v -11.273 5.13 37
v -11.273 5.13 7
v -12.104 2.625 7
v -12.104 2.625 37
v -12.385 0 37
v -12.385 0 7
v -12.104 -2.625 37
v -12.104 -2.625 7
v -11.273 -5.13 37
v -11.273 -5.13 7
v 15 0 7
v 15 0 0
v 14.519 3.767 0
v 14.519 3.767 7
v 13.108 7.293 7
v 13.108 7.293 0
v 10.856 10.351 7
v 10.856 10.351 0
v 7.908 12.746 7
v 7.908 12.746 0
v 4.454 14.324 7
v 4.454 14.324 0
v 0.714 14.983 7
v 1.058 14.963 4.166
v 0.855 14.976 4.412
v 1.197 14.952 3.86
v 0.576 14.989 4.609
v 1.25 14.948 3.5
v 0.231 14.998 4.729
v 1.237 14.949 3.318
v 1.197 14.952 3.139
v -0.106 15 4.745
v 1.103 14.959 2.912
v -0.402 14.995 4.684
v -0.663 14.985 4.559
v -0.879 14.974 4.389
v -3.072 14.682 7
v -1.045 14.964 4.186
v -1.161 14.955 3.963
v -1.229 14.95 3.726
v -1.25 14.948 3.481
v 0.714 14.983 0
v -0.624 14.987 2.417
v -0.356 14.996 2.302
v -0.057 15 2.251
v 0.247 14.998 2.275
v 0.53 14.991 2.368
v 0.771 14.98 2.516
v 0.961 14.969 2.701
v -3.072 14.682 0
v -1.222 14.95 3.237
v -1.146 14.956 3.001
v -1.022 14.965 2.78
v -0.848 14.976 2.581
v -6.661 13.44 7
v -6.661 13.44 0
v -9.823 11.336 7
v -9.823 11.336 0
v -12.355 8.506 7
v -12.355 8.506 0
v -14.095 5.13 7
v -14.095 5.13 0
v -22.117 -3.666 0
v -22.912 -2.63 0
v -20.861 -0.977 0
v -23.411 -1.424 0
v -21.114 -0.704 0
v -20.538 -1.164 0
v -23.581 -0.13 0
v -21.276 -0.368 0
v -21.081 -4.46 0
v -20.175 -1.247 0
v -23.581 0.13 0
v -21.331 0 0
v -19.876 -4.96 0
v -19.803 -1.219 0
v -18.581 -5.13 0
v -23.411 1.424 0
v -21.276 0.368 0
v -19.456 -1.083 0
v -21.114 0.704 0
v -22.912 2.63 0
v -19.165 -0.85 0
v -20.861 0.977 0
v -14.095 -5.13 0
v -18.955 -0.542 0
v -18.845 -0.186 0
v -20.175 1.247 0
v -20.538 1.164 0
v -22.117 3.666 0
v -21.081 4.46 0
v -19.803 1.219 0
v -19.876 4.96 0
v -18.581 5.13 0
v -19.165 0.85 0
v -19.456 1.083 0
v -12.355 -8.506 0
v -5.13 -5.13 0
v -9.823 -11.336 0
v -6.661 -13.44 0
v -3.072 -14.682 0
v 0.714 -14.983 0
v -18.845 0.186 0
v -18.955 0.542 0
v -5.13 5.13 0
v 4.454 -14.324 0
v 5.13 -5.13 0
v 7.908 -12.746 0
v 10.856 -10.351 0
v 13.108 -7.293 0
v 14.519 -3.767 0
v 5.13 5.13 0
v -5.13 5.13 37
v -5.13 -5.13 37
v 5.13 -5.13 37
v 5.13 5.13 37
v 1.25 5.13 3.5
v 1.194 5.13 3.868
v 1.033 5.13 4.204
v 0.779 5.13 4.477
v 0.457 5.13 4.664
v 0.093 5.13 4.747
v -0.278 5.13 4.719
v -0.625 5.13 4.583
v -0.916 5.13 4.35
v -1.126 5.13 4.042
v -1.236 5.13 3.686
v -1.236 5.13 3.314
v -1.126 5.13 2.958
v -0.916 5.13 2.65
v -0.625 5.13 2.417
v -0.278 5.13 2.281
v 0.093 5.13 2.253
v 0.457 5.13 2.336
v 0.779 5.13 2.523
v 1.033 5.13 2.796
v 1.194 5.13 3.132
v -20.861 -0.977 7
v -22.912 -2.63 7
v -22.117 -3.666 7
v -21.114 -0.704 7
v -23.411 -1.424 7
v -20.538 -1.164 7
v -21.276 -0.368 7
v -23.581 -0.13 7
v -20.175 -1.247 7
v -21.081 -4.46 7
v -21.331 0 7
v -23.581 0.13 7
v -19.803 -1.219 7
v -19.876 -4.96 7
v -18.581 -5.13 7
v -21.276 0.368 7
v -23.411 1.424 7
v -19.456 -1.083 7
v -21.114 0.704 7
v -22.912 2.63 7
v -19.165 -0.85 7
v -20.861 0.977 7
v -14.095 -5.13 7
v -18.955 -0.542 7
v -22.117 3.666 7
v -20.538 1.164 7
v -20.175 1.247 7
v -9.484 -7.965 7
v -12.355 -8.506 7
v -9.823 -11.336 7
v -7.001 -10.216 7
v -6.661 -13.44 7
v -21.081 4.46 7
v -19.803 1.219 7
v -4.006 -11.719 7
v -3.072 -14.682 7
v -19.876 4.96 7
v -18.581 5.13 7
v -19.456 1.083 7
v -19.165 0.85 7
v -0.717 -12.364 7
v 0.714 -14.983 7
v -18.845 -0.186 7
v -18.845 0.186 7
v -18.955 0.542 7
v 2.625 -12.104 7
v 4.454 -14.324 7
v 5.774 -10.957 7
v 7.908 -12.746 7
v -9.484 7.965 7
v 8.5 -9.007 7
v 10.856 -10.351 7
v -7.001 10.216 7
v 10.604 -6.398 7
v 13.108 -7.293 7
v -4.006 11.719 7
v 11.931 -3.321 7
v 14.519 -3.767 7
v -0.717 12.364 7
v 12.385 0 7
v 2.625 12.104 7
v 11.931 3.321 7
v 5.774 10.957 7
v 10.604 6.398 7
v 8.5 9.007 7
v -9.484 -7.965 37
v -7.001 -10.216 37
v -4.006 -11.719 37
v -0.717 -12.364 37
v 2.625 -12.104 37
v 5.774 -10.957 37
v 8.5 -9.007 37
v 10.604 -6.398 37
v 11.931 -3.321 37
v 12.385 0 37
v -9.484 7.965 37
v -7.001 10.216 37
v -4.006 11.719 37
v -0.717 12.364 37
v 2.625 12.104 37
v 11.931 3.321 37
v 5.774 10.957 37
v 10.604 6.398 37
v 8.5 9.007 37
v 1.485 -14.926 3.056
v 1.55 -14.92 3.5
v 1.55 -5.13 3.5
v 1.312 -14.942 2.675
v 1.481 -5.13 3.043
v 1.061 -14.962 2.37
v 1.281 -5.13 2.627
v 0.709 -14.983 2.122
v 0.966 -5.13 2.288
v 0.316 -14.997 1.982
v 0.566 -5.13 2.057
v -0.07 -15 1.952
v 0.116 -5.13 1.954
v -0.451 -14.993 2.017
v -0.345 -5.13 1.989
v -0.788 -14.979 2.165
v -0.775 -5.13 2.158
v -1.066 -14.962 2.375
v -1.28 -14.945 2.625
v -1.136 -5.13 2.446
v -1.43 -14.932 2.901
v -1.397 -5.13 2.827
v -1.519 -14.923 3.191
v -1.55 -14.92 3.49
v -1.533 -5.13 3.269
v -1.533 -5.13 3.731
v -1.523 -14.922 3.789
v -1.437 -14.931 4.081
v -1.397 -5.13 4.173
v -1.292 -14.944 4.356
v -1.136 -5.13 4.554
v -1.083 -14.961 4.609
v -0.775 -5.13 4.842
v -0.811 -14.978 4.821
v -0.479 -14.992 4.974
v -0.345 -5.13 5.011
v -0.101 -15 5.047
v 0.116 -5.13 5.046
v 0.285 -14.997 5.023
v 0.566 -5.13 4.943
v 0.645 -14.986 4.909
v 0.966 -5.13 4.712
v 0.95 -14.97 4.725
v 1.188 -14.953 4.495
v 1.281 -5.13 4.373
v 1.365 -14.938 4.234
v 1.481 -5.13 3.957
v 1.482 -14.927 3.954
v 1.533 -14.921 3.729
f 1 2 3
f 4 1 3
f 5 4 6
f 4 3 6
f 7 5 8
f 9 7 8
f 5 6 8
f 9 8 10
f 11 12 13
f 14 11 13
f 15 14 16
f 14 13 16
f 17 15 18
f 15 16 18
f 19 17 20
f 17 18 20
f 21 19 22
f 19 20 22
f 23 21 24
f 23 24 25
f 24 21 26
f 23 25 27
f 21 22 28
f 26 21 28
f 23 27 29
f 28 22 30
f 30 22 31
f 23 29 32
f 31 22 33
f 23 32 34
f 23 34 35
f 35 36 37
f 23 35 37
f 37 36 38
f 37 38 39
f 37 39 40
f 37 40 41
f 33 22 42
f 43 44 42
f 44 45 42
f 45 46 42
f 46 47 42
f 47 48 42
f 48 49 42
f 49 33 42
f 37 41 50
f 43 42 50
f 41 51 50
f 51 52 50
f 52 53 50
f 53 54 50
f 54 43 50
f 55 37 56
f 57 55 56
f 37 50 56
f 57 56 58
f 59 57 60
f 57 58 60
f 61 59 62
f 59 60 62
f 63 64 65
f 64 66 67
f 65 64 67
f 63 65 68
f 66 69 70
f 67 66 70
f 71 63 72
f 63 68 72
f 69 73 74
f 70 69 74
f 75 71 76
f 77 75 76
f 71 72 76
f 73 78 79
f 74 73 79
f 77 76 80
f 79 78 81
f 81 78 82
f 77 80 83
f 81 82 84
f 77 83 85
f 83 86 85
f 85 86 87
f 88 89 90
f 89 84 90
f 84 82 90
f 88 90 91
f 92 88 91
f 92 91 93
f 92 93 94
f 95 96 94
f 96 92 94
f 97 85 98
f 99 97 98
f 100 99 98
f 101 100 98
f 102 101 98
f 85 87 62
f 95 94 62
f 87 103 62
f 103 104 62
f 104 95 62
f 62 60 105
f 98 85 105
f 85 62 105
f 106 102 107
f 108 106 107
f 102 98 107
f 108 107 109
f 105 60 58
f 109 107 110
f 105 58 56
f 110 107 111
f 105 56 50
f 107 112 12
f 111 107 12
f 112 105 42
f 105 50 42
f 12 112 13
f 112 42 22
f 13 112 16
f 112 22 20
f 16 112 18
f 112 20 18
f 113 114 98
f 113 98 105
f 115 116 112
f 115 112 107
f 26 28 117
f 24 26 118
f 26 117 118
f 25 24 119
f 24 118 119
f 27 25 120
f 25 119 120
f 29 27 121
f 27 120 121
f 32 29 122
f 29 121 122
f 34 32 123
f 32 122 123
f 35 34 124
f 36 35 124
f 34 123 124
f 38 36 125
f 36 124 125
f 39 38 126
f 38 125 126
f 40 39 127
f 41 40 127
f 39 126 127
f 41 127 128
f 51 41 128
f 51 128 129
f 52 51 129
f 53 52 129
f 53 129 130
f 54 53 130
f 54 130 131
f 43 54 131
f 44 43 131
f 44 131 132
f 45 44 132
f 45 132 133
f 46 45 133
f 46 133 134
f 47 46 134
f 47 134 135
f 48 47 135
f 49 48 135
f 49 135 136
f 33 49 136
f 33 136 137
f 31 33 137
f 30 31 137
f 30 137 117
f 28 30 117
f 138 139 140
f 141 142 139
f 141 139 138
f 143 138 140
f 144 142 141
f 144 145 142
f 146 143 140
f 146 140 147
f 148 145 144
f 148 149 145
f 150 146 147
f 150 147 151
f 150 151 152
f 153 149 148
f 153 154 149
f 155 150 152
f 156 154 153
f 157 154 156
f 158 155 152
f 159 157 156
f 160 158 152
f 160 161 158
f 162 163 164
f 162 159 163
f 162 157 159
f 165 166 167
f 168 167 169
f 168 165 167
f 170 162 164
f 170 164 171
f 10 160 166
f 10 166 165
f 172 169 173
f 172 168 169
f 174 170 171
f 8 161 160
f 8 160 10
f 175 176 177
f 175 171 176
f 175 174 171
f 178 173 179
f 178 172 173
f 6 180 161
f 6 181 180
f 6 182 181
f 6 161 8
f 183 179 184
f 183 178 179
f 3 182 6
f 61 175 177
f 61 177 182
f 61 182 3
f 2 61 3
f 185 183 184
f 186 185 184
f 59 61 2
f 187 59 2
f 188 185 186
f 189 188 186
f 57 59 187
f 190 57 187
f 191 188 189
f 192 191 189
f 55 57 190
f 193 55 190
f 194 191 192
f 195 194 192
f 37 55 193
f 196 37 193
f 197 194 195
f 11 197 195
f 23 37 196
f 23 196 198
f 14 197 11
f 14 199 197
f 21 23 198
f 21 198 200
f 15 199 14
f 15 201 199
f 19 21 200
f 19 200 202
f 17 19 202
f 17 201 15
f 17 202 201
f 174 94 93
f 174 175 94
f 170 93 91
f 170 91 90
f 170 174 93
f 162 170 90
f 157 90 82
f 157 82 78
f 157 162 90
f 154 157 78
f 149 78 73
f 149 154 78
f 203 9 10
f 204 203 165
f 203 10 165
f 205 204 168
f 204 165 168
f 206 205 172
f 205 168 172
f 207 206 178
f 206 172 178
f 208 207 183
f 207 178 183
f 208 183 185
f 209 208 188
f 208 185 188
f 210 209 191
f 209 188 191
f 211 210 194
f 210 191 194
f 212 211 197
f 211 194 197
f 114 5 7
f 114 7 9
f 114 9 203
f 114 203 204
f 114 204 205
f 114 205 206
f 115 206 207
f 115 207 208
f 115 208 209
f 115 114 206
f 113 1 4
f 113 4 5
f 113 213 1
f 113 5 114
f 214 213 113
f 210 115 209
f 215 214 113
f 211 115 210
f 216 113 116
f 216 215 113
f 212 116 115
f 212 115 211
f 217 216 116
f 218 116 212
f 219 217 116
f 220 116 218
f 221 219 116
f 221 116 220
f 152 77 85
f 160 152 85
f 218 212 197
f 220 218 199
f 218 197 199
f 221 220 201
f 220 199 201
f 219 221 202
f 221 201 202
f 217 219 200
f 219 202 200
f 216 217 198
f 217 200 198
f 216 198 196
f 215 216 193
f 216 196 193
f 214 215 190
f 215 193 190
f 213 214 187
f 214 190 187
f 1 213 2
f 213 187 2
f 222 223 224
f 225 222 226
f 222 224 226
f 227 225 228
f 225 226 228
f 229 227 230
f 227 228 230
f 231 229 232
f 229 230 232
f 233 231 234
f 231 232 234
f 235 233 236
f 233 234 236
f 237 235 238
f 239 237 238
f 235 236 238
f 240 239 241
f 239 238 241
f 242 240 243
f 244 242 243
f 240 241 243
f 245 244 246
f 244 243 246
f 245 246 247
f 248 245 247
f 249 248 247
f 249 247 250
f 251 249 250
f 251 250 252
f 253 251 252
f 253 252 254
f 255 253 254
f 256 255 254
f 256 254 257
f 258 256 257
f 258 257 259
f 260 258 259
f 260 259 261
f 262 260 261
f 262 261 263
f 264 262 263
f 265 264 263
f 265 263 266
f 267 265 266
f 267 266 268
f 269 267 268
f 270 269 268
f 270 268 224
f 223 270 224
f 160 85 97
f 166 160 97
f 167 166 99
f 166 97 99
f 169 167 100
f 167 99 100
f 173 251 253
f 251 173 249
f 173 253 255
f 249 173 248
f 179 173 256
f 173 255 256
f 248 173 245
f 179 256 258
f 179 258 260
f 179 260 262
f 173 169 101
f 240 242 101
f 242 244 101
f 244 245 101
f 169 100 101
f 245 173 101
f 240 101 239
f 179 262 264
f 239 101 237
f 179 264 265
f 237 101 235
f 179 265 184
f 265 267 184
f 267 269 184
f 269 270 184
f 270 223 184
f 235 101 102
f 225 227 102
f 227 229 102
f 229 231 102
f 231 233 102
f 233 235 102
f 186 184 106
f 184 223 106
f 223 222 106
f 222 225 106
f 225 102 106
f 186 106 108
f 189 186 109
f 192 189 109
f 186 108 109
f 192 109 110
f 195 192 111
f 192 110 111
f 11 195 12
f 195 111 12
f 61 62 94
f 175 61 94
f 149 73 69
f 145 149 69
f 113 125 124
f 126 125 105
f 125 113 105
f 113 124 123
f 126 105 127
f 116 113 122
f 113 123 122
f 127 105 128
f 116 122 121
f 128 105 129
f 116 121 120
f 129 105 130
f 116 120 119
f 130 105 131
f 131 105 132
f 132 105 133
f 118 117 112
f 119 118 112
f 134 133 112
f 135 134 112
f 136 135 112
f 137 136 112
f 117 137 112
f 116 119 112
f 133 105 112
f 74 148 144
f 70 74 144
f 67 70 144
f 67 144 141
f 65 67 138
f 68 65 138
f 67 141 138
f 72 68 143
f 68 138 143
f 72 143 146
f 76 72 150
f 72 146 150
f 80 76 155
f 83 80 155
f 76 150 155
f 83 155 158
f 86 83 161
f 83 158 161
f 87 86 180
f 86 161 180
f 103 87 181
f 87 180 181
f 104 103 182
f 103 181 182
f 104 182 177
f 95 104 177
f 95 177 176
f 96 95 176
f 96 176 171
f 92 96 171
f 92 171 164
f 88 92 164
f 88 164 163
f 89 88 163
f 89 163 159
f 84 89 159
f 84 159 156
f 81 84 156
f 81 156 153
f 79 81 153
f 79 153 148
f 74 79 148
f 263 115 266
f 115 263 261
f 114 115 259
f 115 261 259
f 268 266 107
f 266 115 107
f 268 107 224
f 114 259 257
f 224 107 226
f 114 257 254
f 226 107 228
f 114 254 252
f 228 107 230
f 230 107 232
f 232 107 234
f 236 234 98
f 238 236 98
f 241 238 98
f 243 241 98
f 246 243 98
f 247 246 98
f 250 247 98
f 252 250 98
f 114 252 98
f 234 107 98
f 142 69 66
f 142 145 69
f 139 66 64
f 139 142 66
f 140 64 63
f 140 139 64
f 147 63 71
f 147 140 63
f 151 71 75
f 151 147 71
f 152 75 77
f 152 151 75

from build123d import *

# Parameters (mm, degrees)
F1_DEPTH = 7
F2_DEPTH = 37
F4_D     = 2.5
F4_DEPTH = 9.871
F5_D     = 3.1
F5_DEPTH = 20.1310001
F6_R     = 5
F7_D     = 2.5


with BuildPart() as f1:
    # F0 (on Top) → F1 (new body)
    with BuildSketch(Plane.XY):
        with BuildLine():
            ThreePointArc((-14.0954992817, -5.13), (2.6045643373, -14.7721442117), (15, 0))
            ThreePointArc((15, 0), (2.6045643373, 14.7721442117), (-14.0954992817, 5.13))
            Line((-14.0954992817, 5.13), (-11.2725917605, 5.13))
            ThreePointArc((-11.2725917605, 5.13), (2.6246119757, 12.1037034406), (12.385, 0))
            ThreePointArc((12.385, 0), (2.6246119757, -12.1037034406), (-11.2725917605, -5.13))
            Line((-11.2725917605, -5.13), (-14.0954992817, -5.13))
        make_face()
        with BuildLine():
            Line((-11.2725917605, 5.13), (-14.0954992817, 5.13))
            ThreePointArc((-14.0954992817, 5.13), (-15, 0), (-14.0954992817, -5.13))
            Line((-14.0954992817, -5.13), (-11.2725917605, -5.13))
            ThreePointArc((-11.2725917605, -5.13), (-12.385, 0), (-11.2725917605, 5.13))
        make_face()
        with BuildLine():
            ThreePointArc((12.385, 0), (2.6246119757, 12.1037034406), (-11.2725917605, 5.13))
            Line((-11.2725917605, 5.13), (-5.13, 5.13))
            Line((-5.13, 5.13), (5.13, 5.13))
            Line((5.13, 5.13), (5.13, -5.13))
            Line((5.13, -5.13), (-5.13, -5.13))
            Line((-5.13, -5.13), (-11.2725917605, -5.13))
            ThreePointArc((-11.2725917605, -5.13), (2.6246119757, -12.1037034406), (12.385, 0))
        make_face()
        with BuildLine():
            Line((-5.13, 5.13), (-11.2725917605, 5.13))
            ThreePointArc((-11.2725917605, 5.13), (-12.385, 0), (-11.2725917605, -5.13))
            Line((-11.2725917605, -5.13), (-5.13, -5.13))
            Line((-5.13, -5.13), (-5.13, 5.13))
        make_face()
        with BuildLine():
            ThreePointArc((-14.0954992817, -5.13), (-15, 0), (-14.0954992817, 5.13))
            Line((-14.0954992817, 5.13), (-23.5814342785, 5.13))
            Line((-23.5814342785, 5.13), (-23.5814342785, 0))
            Line((-23.5814342785, 0), (-23.5814342785, -5.13))
            Line((-23.5814342785, -5.13), (-14.0954992817, -5.13))
        make_face()
    extrude(amount=F1_DEPTH)

    # F0 (on Top) → F2 (join)
    with BuildSketch(Plane.XY):
        with BuildLine():
            Line((-5.13, 5.13), (-11.2725917605, 5.13))
            ThreePointArc((-11.2725917605, 5.13), (-12.385, 0), (-11.2725917605, -5.13))
            Line((-11.2725917605, -5.13), (-5.13, -5.13))
            Line((-5.13, -5.13), (-5.13, 5.13))
        make_face()
        with BuildLine():
            ThreePointArc((12.385, 0), (2.6246119757, 12.1037034406), (-11.2725917605, 5.13))
            Line((-11.2725917605, 5.13), (-5.13, 5.13))
            Line((-5.13, 5.13), (5.13, 5.13))
            Line((5.13, 5.13), (5.13, -5.13))
            Line((5.13, -5.13), (-5.13, -5.13))
            Line((-5.13, -5.13), (-11.2725917605, -5.13))
            ThreePointArc((-11.2725917605, -5.13), (2.6246119757, -12.1037034406), (12.385, 0))
        make_face()
    extrude(amount=F2_DEPTH)

    # F4 (through all, one way)
    with BuildSketch(Plane.XZ.offset(-5.13)):
        with Locations((0, 3.5)):
            Circle(F4_D / 2)
    extrude(amount=-F4_DEPTH, mode=Mode.SUBTRACT)

    # F5 (through all, one way)
    with BuildSketch(Plane(origin=(0, 5.13, 0), x_dir=(1, 0, 0), z_dir=(0, 1, 0))):
        with Locations((0, -3.5)):
            Circle(F5_D / 2)
    extrude(amount=-F5_DEPTH, mode=Mode.SUBTRACT)

    # F6
    f6_edges = [f1.edges().sort_by_distance(p)[0] for p in [
        (-23.581434, -5.13, 3.5),
        (-23.581434, 5.13, 3.5),
    ]]
    fillet(f6_edges, radius=F6_R)

    # F7 (through all)
    with Locations(Plane(origin=(0, 0, 0), x_dir=(1, 0, 0), z_dir=(0, 0, -1))):
        with Locations((-20.0814342785, 0)):
            Hole(F7_D / 2)


solid = f1.part
